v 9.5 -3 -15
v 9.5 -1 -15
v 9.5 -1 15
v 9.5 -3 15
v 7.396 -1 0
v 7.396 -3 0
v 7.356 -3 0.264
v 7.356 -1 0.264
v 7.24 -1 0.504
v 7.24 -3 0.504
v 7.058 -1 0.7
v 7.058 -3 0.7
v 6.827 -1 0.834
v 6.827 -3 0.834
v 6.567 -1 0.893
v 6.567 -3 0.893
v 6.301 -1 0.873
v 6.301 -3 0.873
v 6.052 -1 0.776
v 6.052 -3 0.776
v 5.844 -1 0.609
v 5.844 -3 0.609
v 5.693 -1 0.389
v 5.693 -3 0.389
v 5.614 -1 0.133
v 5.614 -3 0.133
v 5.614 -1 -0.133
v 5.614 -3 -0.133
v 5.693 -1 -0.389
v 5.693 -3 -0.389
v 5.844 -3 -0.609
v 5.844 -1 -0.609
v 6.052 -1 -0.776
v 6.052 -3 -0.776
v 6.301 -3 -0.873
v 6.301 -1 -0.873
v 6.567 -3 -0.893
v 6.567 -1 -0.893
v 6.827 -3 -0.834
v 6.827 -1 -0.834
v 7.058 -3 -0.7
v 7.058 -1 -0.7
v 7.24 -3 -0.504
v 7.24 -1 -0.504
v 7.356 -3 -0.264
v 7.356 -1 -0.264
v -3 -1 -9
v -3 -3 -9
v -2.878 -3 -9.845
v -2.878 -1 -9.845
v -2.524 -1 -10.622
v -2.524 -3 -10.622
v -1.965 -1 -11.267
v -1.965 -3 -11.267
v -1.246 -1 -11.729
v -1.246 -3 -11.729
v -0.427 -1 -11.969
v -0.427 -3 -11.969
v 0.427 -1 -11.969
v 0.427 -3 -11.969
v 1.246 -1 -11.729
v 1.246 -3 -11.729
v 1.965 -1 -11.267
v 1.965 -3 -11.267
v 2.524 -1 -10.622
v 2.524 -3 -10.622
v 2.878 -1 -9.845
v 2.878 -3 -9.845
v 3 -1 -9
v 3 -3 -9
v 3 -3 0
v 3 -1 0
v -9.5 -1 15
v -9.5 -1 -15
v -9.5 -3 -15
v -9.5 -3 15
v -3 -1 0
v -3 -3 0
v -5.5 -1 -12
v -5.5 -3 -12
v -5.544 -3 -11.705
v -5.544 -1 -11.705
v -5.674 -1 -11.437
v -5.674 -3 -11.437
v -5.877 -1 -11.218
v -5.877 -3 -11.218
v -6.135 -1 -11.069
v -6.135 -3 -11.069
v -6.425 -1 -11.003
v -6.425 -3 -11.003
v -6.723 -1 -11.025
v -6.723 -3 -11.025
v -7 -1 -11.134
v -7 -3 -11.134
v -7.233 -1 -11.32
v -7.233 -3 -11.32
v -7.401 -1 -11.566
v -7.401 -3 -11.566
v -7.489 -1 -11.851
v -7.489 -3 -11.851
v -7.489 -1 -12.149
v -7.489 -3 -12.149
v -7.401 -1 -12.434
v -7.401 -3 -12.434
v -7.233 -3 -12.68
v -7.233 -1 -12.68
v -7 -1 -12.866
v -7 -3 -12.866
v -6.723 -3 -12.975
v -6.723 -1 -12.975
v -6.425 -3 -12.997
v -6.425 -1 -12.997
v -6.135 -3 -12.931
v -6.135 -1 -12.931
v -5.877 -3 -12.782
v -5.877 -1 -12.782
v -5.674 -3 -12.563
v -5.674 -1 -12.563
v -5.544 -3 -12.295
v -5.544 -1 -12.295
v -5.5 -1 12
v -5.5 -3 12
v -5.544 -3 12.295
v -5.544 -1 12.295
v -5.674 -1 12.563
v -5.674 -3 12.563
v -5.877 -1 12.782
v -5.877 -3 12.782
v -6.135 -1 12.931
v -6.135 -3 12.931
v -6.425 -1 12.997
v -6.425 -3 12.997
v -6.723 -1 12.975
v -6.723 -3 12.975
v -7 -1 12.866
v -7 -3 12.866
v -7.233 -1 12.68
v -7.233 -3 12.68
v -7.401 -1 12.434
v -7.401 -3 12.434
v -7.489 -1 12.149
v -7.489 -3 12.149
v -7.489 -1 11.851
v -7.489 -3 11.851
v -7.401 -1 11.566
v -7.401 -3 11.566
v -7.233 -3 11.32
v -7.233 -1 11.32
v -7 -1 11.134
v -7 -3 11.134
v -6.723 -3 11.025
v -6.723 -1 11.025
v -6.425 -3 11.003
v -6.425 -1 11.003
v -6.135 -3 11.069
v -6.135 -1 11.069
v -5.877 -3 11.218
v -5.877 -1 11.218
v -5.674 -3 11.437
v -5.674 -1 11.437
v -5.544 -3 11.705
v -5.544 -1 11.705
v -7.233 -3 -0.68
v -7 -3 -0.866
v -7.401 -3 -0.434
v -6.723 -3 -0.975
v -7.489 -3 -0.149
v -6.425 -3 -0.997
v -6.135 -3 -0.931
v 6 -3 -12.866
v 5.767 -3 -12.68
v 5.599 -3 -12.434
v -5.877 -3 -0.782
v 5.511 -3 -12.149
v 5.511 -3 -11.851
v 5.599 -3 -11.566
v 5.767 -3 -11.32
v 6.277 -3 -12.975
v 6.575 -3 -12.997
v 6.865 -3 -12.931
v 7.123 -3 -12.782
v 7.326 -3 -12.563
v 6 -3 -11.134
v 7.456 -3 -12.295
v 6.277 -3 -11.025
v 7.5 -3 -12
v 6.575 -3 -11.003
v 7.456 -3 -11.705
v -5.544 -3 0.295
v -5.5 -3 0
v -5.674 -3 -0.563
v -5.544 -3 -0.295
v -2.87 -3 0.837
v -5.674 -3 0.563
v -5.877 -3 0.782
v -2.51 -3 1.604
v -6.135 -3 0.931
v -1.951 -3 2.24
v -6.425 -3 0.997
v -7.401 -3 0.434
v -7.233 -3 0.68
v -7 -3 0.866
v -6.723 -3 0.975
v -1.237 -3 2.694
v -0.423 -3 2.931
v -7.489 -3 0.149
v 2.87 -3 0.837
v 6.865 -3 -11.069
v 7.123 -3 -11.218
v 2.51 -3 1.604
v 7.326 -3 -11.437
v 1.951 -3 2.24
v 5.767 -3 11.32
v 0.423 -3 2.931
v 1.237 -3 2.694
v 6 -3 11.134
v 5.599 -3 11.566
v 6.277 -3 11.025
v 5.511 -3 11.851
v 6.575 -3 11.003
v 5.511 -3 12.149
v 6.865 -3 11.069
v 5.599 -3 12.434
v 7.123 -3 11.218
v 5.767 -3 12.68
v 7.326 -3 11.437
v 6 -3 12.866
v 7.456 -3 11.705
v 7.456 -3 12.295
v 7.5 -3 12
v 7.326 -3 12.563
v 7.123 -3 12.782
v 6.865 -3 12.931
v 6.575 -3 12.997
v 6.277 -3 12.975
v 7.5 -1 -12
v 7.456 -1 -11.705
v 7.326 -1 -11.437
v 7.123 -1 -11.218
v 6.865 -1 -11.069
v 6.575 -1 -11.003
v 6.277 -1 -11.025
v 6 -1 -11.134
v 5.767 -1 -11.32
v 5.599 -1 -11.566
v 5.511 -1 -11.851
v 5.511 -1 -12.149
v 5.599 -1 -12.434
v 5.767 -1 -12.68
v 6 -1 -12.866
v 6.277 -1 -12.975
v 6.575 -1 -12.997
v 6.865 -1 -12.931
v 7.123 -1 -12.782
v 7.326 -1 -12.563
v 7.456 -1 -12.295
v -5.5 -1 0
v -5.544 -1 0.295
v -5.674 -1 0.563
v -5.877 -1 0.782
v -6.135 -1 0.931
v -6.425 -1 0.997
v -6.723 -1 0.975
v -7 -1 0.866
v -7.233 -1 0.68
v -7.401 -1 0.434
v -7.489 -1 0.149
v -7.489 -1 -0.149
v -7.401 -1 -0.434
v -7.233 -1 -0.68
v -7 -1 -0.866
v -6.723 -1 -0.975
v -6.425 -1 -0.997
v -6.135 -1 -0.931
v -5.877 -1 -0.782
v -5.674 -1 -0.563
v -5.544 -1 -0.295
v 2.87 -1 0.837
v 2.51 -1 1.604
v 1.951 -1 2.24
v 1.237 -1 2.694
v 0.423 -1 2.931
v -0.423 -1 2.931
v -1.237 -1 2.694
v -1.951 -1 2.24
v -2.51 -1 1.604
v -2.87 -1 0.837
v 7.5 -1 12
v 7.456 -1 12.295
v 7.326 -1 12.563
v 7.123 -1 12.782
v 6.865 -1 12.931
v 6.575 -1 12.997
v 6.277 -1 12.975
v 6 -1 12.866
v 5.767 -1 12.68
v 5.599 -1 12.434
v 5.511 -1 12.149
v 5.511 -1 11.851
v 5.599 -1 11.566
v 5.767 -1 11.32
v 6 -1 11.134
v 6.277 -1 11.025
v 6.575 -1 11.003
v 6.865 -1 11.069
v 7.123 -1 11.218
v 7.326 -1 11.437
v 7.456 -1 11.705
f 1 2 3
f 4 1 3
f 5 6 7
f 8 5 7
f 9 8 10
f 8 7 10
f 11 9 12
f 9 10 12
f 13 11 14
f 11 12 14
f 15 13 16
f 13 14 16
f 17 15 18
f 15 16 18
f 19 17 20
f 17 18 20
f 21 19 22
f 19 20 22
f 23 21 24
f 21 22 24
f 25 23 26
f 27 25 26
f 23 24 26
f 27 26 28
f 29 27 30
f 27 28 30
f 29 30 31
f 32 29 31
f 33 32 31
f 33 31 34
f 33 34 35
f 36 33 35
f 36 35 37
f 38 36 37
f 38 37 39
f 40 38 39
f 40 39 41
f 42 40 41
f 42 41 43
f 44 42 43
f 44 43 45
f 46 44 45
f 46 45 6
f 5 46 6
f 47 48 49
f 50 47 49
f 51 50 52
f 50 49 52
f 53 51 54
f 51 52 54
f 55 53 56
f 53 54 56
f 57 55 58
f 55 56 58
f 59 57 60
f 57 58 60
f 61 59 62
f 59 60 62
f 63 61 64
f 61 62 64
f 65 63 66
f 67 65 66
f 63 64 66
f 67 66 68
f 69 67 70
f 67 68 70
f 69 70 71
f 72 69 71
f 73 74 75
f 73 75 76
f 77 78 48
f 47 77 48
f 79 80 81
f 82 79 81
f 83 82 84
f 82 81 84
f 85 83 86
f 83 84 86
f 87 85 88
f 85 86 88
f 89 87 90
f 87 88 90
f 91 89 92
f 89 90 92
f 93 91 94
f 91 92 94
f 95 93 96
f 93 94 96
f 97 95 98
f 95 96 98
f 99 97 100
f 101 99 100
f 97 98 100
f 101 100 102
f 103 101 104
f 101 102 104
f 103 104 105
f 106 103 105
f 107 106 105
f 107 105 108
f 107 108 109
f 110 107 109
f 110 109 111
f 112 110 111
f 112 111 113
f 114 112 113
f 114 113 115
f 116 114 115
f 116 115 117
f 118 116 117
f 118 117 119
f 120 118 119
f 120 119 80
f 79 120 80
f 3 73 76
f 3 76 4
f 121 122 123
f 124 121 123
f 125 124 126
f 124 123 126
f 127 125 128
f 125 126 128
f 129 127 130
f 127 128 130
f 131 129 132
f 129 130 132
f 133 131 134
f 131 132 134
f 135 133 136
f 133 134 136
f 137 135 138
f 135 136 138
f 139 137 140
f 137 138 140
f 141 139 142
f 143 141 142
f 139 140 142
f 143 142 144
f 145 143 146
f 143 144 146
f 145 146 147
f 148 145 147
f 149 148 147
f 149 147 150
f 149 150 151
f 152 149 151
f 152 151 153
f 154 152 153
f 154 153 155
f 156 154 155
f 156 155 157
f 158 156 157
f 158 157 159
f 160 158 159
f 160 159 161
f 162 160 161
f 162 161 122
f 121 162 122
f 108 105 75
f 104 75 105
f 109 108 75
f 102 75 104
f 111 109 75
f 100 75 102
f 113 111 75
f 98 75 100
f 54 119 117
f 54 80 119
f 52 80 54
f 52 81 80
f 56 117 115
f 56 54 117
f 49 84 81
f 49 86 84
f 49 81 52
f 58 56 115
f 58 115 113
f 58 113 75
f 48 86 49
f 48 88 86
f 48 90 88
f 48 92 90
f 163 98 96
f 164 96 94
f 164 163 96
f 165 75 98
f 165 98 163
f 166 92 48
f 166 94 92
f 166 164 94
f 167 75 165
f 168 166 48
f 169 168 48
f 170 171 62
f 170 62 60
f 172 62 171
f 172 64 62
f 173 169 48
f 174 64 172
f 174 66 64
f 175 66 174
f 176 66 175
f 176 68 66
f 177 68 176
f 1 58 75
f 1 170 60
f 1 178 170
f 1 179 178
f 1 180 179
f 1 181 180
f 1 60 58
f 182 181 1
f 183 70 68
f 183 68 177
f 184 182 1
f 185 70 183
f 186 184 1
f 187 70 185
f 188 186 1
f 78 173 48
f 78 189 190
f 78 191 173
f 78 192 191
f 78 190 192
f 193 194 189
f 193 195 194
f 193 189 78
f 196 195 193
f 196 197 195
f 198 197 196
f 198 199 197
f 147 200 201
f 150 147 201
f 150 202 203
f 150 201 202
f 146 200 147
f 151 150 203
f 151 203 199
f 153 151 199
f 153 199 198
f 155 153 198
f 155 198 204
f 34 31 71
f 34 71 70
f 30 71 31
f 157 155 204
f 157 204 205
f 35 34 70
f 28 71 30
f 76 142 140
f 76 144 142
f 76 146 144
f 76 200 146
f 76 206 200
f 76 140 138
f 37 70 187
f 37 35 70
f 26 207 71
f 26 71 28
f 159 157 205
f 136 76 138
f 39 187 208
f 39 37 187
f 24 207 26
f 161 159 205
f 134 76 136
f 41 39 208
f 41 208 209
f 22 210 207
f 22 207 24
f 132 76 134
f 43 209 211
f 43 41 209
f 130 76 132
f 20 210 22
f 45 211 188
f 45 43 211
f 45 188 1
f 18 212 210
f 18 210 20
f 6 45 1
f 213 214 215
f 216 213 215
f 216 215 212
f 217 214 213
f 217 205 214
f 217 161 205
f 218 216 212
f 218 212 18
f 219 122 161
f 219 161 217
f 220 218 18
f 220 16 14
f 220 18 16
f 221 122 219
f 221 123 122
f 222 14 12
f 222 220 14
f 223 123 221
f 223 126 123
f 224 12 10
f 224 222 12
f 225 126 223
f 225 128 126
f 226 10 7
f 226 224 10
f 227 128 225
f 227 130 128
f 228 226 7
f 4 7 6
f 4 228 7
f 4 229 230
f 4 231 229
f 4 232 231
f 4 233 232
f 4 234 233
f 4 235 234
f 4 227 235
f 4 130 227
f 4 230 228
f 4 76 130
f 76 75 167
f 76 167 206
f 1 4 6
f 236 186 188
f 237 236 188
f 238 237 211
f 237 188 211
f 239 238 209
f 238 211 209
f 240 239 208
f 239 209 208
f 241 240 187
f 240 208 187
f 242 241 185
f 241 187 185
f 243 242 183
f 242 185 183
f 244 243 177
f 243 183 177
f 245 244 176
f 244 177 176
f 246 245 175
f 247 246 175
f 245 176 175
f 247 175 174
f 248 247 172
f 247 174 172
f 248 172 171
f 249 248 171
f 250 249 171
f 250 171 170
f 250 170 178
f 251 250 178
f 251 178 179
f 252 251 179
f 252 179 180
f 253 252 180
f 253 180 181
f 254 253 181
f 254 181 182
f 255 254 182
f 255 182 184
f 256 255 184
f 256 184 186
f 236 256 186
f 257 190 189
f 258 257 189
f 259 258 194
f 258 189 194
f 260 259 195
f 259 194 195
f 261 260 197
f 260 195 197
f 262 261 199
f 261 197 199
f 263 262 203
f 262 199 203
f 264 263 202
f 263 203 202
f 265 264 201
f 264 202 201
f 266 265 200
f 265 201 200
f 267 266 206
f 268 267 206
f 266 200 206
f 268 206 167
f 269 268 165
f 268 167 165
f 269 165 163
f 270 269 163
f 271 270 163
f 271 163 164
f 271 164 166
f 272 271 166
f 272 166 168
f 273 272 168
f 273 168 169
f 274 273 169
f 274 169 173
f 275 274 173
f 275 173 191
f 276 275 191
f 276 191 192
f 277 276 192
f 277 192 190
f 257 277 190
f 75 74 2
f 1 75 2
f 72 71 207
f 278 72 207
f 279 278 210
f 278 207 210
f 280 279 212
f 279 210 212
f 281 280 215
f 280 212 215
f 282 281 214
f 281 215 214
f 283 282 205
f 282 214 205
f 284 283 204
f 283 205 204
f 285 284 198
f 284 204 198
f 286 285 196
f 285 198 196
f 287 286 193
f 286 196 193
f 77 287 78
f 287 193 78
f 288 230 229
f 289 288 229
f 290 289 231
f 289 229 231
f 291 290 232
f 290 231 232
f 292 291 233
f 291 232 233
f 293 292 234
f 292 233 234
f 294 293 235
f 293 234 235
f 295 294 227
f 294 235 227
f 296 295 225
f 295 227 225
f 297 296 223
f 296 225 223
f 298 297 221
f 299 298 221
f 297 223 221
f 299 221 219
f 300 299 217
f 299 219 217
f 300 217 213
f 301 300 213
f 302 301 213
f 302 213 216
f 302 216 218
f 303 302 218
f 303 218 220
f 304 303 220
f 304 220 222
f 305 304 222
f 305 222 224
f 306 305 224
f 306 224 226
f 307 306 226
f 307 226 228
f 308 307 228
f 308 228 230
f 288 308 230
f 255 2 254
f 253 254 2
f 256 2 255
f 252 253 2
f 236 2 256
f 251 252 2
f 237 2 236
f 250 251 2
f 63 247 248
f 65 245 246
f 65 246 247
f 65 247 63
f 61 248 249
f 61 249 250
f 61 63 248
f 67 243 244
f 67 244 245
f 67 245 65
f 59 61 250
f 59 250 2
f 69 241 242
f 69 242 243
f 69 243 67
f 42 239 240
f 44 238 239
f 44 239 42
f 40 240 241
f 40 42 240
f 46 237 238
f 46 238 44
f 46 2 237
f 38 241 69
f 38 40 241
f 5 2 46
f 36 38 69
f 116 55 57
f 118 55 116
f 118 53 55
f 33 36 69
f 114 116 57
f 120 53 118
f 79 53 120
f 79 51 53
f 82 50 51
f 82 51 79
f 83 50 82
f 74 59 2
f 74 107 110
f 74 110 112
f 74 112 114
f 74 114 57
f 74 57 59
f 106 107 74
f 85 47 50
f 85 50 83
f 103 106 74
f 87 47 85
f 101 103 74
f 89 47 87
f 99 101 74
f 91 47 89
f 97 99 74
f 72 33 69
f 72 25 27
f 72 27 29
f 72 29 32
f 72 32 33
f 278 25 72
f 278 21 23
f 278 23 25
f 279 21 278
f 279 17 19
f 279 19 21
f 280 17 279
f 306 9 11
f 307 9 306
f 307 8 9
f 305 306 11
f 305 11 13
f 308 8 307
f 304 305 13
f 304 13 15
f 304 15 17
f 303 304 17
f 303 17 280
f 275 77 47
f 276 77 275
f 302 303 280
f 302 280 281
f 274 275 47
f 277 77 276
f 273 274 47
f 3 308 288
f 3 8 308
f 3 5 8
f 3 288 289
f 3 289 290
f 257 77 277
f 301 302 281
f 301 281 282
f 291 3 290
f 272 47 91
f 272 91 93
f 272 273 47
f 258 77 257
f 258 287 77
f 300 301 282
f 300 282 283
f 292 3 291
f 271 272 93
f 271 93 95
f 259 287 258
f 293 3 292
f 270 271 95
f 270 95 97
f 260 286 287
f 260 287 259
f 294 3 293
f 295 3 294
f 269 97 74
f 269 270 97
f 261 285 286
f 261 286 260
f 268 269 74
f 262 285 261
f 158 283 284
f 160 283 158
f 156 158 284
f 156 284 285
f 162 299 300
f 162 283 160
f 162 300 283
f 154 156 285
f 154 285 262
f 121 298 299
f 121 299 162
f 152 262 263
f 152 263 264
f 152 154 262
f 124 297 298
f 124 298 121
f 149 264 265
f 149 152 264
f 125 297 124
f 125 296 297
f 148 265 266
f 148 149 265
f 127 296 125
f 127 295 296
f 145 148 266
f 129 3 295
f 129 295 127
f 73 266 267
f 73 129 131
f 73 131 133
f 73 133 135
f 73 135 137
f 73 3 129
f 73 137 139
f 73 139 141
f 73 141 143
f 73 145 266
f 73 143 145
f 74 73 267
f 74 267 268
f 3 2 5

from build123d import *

# Parameters (mm, degrees)
F0_W      = 19
F0_H      = 30
F1_DEPTH  = 5
F3_DEPTH  = 3
F4_R      = 1
F4_R_2    = 0.895507
F5_DEPTH  = 25
F6_DEPTH  = 25
F7_W      = 43.592543
F7_H      = 48.578868
F8_DEPTH  = 2
F9_W      = 52.903849
F9_H      = 60.980772
F10_DEPTH = 1
F11_DEPTH = 25


with BuildPart() as f1:
    # F0 (on Front) → F1 (new body)
    with BuildSketch(Plane.XZ):
        Rectangle(F0_W, F0_H)
    extrude(amount=F1_DEPTH)

    # F2 (on face) → F3 (cut)
    with BuildSketch(Plane.XZ.offset(5)):
        with BuildLine():
            Line((-3, 0), (-3, -9))
            ThreePointArc((-3, -9), (0, -12), (3, -9))
            Line((3, -9), (3, 0))
            ThreePointArc((3, 0), (0, 2.961188), (-3, 0))
        make_face()
    extrude(amount=-F3_DEPTH, mode=Mode.SUBTRACT)

    # F4 (on face) → F5 (cut)
    with BuildSketch(Plane.XZ.offset(2)):
        with Locations((-6.5, 12)):
            Circle(F4_R)
        with Locations((6.5, 12)):
            Circle(F4_R)
        with Locations((6.5, -12)):
            Circle(F4_R)
        with Locations((-6.5, -12)):
            Circle(F4_R)
        with Locations((-6.5, 0)):
            Circle(F4_R)
        with Locations((6.5, 0)):
            Circle(F4_R_2)
    extrude(amount=-F5_DEPTH, mode=Mode.SUBTRACT)

    # F4 (on face) → F6 (cut)
    with BuildSketch(Plane.XZ.offset(2)):
        with Locations((-6.5, 12)):
            Circle(F4_R)
        with Locations((6.5, 12)):
            Circle(F4_R)
        with Locations((6.5, -12)):
            Circle(F4_R)
        with Locations((-6.5, -12)):
            Circle(F4_R)
        with Locations((-6.5, 0)):
            Circle(F4_R)
        with Locations((6.5, 0)):
            Circle(F4_R_2)
    extrude(amount=F6_DEPTH, mode=Mode.SUBTRACT)

    # F7 (on face) → F8 (cut)
    with BuildSketch(Plane.XZ.offset(5)):
        with Locations((0.917289, -2.192111)):
            Rectangle(F7_W, F7_H)
    extrude(amount=-F8_DEPTH, mode=Mode.SUBTRACT)

    # F9 (on face) → F10 (cut)
    with BuildSketch(Plane(origin=(0, 0, 0), x_dir=(-1, 0, 0), z_dir=(0, 1, 0))):
        with Locations((0.067309, -0.875001)):
            Rectangle(F9_W, F9_H)
    extrude(amount=-F10_DEPTH, mode=Mode.SUBTRACT)

    # F2 (on face) → F11 (cut)
    with BuildSketch(Plane.XZ.offset(5)):
        with BuildLine():
            Line((-3, 0), (-3, -9))
            ThreePointArc((-3, -9), (0, -12), (3, -9))
            Line((3, -9), (3, 0))
            ThreePointArc((3, 0), (0, 2.961188), (-3, 0))
        make_face()
    extrude(amount=-F11_DEPTH, mode=Mode.SUBTRACT)


solid = f1.part
